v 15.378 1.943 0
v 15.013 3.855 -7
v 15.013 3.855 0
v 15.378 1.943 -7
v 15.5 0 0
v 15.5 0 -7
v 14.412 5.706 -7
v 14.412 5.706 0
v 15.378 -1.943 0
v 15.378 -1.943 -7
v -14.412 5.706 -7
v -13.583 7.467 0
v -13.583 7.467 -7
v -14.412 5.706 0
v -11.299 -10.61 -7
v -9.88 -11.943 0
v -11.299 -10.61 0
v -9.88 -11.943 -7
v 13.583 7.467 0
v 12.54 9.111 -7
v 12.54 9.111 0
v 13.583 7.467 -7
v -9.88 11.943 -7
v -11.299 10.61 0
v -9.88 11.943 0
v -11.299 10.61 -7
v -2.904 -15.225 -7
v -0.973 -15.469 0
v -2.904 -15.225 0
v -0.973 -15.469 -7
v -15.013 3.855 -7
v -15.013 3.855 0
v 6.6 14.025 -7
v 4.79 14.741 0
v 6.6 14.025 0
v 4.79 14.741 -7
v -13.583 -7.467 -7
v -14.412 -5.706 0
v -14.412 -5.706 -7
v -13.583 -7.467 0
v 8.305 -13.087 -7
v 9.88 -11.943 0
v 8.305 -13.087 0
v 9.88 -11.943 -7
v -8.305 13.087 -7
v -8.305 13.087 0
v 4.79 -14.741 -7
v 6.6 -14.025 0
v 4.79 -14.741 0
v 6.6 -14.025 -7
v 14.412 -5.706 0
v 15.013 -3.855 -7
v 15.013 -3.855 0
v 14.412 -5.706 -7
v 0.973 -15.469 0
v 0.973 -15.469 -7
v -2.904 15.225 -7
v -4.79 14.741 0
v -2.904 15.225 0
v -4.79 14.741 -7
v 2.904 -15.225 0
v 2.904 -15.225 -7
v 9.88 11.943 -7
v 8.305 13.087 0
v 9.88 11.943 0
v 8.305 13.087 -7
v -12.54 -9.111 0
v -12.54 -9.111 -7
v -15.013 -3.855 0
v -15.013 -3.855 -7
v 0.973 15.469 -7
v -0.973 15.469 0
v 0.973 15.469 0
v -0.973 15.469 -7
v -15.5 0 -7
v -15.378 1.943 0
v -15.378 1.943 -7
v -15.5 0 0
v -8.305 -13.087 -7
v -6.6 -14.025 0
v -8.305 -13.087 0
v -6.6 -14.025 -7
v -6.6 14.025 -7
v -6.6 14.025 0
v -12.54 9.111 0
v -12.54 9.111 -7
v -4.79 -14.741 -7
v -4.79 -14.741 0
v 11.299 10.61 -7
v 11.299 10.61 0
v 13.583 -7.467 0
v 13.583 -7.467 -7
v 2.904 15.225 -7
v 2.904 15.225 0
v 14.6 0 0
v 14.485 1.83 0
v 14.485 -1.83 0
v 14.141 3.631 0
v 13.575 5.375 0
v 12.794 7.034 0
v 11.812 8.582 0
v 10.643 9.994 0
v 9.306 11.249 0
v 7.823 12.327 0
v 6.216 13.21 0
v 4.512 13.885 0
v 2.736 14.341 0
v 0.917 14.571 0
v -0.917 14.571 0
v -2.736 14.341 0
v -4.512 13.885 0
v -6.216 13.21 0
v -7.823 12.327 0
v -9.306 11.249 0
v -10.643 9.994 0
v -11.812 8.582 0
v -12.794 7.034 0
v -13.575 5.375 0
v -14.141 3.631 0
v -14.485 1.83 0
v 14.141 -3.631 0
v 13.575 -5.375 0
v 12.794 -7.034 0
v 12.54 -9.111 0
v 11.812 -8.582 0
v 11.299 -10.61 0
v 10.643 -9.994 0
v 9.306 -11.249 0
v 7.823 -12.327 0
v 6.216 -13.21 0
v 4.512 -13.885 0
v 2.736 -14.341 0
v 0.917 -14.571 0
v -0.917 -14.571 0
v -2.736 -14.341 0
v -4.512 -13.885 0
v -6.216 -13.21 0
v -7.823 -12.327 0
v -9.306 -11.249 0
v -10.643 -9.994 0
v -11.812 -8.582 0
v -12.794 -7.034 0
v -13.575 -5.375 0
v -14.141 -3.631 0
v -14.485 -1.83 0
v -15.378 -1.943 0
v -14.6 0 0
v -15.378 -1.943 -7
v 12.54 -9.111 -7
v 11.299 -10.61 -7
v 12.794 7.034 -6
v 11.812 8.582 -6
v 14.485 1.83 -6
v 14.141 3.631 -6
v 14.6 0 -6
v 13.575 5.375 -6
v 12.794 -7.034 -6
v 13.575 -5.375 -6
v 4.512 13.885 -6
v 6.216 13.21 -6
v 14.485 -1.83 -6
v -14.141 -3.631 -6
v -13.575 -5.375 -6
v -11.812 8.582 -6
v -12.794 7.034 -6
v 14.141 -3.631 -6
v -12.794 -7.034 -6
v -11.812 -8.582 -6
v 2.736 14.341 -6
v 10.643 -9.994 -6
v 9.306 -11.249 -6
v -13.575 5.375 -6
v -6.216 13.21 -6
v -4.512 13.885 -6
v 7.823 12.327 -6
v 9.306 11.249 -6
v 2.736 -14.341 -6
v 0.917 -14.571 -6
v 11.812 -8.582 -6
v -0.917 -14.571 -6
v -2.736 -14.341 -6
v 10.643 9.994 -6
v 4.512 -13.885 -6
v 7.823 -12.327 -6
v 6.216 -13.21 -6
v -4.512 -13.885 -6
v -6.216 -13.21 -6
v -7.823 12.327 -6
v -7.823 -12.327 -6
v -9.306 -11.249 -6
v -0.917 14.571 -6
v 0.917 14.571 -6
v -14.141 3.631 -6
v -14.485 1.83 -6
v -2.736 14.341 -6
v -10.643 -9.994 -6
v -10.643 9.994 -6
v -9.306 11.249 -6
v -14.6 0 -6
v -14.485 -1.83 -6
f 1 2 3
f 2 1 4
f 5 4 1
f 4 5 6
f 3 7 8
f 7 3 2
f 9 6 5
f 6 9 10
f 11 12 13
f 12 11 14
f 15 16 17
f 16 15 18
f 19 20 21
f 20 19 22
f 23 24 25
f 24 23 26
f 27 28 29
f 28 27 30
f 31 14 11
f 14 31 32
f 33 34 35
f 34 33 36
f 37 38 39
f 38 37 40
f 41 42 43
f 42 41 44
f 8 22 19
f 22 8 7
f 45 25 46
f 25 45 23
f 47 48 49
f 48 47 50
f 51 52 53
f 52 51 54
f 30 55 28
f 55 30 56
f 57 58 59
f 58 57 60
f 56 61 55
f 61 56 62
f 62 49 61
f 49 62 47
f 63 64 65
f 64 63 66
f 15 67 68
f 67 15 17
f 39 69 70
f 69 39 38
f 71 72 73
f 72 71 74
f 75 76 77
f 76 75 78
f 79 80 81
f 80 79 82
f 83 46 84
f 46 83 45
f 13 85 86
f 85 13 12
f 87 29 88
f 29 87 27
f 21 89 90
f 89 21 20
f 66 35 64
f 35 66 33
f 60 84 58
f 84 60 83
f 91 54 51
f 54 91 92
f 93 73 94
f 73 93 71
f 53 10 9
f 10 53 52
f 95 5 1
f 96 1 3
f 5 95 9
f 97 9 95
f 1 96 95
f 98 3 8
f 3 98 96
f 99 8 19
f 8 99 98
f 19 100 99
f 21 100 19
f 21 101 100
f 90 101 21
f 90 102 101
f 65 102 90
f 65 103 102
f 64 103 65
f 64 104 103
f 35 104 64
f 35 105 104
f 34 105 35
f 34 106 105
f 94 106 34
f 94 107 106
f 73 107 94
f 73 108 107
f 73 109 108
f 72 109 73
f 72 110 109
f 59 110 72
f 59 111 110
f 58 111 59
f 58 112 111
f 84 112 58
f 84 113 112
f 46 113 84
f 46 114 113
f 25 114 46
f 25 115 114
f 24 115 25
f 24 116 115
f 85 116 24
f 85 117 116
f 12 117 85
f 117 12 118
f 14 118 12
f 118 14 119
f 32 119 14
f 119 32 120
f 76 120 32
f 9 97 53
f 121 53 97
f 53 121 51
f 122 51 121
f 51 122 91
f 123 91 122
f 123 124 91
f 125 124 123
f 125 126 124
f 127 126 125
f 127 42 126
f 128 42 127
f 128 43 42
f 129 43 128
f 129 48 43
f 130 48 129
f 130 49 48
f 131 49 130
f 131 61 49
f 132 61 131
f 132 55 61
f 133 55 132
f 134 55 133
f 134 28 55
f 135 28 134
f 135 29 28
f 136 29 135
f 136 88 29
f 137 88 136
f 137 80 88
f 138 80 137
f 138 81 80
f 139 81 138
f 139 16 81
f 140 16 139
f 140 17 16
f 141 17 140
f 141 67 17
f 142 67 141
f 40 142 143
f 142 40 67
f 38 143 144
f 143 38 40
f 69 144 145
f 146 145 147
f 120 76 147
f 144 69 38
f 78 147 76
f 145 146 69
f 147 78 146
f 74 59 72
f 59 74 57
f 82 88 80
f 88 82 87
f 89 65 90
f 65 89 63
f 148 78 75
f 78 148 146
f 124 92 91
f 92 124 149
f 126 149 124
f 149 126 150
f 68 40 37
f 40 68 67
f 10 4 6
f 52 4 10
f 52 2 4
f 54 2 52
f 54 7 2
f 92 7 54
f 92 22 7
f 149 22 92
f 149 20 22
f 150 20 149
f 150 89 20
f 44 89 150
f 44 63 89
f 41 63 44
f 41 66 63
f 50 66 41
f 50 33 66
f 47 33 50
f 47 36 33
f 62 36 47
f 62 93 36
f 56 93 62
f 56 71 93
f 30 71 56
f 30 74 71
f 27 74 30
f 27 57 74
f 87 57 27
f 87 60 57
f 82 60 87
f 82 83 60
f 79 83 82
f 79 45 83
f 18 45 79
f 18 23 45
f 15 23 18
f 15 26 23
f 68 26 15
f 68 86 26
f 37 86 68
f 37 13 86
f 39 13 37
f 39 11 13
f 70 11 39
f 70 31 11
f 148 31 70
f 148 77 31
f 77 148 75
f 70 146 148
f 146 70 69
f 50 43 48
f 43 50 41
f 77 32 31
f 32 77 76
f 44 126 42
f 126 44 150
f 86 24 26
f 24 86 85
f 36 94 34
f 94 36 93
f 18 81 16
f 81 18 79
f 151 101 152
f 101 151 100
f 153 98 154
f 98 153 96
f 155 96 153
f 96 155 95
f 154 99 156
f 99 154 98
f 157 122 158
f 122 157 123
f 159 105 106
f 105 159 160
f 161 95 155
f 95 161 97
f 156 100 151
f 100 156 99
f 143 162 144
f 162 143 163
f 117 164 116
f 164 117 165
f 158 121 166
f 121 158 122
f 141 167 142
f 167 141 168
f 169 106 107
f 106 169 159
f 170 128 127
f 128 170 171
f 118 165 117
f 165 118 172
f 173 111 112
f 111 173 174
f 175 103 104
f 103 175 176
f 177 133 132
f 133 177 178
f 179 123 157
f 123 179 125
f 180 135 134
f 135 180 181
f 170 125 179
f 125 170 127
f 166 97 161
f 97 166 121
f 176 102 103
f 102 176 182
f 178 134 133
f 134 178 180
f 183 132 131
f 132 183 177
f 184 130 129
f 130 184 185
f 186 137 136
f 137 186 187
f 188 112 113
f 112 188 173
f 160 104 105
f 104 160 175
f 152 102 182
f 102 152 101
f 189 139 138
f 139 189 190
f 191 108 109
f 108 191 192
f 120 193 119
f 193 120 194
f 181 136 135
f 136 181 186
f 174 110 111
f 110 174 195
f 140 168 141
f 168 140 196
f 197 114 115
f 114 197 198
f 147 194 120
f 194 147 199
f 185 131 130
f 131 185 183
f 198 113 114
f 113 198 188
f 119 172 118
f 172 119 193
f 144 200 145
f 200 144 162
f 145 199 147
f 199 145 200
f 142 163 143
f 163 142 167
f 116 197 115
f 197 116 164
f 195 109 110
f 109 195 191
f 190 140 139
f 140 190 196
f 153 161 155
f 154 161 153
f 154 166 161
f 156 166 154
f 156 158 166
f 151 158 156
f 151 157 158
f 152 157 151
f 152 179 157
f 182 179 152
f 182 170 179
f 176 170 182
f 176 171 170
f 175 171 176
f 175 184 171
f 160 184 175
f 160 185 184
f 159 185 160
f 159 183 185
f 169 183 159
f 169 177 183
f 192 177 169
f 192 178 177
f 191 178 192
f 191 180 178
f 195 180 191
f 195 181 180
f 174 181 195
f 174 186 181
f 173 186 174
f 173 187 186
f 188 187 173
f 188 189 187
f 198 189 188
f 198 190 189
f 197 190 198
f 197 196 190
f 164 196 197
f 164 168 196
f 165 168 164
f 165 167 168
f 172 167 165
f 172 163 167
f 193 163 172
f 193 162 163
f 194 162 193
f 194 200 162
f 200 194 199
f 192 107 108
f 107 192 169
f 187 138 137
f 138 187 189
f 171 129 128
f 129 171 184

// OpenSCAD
$fn = 50;


difference() {
	union() {
		translate(v = [0, 0, -7.0000000000]) {
			cylinder(h = 7, r = 15.5000000000);
		}
	}
	union() {
		#translate(v = [0, 0, -6.0000000000]) {
			cylinder(h = 6, r = 14.6000000000);
		}
	}
}
